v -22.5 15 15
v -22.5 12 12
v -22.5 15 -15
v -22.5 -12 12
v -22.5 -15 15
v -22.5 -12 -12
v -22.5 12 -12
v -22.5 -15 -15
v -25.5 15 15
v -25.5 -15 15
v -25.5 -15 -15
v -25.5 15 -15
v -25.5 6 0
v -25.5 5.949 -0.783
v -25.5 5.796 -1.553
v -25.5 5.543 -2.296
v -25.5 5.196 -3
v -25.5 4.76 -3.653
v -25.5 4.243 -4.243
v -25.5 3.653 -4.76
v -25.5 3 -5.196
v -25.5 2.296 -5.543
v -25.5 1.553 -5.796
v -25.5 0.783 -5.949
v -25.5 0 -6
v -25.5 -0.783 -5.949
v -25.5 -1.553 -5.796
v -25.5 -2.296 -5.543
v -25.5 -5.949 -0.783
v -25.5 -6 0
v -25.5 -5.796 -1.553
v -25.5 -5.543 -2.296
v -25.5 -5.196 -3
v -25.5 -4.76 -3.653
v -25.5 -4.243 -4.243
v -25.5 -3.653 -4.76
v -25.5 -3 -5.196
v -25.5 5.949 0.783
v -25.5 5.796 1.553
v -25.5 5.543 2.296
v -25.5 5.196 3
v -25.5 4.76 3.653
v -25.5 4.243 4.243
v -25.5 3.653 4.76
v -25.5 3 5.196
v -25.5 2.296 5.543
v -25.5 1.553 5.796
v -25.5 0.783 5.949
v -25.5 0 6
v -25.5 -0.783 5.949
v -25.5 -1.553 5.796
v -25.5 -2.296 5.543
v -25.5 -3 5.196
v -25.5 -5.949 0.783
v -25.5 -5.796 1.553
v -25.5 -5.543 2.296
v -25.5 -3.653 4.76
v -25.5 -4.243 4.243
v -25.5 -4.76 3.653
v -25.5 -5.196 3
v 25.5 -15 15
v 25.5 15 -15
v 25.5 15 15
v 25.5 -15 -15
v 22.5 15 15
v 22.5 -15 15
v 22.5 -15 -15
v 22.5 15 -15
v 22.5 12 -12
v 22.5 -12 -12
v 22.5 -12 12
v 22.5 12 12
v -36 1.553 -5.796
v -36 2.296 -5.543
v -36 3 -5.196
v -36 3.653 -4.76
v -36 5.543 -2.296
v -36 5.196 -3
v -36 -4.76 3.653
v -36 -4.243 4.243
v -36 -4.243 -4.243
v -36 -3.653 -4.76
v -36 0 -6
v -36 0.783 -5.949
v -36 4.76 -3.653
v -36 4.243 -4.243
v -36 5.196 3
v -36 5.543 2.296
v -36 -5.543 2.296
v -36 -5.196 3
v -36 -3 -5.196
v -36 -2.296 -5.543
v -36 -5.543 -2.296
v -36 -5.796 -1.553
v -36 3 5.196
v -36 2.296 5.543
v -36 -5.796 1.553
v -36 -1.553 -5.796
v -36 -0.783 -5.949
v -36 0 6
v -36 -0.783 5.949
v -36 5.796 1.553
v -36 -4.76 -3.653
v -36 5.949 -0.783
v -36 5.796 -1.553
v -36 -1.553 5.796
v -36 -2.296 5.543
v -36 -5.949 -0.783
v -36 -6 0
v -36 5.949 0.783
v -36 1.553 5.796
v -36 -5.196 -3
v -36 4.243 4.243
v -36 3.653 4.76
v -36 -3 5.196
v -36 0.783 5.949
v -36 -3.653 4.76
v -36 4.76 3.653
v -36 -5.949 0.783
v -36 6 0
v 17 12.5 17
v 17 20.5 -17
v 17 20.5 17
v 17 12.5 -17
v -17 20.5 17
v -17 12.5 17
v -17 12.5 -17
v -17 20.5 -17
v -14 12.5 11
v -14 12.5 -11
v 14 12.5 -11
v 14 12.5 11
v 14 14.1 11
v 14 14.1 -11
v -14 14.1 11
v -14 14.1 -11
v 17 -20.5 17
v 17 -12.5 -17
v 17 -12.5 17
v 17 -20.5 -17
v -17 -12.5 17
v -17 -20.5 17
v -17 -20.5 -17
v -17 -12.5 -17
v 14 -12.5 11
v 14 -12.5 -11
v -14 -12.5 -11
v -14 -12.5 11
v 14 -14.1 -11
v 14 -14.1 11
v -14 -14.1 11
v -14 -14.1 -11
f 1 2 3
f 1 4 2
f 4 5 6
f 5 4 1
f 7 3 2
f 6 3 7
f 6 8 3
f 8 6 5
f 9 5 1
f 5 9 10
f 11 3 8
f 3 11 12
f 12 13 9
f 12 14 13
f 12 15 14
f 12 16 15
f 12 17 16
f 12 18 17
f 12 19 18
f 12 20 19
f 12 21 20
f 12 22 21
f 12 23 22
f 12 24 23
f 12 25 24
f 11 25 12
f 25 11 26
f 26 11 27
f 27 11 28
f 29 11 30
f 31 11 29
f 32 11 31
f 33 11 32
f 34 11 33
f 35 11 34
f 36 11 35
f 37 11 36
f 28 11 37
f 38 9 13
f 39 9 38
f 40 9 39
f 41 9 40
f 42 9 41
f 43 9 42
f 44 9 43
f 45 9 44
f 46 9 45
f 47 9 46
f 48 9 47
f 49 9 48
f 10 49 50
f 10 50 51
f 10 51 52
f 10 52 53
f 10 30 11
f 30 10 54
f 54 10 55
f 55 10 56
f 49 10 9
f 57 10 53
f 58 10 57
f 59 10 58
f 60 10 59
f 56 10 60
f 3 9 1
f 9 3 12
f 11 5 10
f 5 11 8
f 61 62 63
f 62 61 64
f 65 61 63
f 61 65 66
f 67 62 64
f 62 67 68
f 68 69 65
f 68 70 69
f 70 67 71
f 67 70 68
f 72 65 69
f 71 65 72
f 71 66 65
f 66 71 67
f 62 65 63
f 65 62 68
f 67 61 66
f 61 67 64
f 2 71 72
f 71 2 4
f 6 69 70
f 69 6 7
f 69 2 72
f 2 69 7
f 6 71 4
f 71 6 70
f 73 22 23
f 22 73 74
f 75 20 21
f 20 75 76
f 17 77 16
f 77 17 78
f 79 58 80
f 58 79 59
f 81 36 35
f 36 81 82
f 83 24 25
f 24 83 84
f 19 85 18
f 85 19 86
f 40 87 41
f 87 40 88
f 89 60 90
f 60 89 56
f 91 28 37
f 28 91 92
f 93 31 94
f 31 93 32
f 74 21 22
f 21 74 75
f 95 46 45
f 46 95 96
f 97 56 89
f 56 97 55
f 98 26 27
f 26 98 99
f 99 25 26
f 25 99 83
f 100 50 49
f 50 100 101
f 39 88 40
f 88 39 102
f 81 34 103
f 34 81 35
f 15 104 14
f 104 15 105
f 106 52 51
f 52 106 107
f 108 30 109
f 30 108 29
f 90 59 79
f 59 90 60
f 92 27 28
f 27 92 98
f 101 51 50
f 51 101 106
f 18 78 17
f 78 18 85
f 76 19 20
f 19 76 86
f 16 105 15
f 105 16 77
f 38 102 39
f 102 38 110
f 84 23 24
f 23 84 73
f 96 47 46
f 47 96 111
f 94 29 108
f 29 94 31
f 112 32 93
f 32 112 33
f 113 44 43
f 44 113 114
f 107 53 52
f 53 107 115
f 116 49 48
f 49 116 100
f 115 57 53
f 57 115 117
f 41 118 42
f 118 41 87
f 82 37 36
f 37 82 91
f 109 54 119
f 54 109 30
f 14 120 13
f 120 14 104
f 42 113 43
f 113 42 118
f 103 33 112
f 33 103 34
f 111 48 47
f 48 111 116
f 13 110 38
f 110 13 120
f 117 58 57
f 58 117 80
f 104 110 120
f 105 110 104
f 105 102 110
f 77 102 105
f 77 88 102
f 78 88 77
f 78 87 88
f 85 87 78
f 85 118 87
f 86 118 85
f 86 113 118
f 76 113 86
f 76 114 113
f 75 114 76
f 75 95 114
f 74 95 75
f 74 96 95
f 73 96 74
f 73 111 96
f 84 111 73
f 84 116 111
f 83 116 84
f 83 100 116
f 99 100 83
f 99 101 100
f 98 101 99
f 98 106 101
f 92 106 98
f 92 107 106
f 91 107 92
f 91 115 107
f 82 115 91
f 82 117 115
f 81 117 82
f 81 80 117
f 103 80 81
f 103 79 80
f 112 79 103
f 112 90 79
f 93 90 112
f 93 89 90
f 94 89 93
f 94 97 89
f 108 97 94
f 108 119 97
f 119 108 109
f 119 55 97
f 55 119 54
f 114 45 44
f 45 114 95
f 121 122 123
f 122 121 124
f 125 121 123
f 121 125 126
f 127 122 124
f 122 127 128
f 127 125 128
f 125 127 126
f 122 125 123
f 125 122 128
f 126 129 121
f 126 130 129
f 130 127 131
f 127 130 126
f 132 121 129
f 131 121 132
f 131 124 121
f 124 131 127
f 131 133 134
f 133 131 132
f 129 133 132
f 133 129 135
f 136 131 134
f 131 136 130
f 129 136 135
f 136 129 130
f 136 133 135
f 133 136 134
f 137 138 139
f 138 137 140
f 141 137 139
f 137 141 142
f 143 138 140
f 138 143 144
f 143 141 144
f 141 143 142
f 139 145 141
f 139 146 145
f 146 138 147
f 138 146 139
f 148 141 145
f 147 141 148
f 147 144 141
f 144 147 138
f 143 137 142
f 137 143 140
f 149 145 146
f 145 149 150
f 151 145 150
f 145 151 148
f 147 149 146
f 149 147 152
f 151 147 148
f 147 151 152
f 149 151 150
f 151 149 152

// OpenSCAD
// RoboBarista IR40-50 shared grip concept, millimetres.
// CONCEPT ONLY. Not load-rated, not dimensioned to vendor CAD.
// part: "handle", "finger", "assembly"; mount: "portafilter" or "pitcher".
part="assembly";
mount="portafilter";
grip_width=24; // across closing direction (Y)
grip_height=24;
grip_length=48;
stop_width=3;
stop_height=3;
clearance=0.5;
finger_thickness=8;
finger_length=34;
$fn=48;

module handle() {
  color("dimgray")
  union() {
    // Positive stops in the tool axis direction X.
    translate([-grip_length/2,0,0]) cube([stop_width,grip_width+2*stop_height,grip_height+2*stop_height],center=true);
    translate([grip_length/2,0,0]) cube([stop_width,grip_width+2*stop_height,grip_height+2*stop_height],center=true);
    cube([grip_length,grip_width,grip_height],center=true);
    // Conceptual mounting stem, NOT a real Decent thread or pitcher fastener.
    translate([-grip_length/2-12,0,0]) rotate([0,90,0]) cylinder(d=12,h=12);
  }
}
module finger(side=1) {
  color("teal")
  difference() {
    translate([0,side*(grip_width/2+clearance+finger_thickness/2),0])
      cube([finger_length,finger_thickness,grip_height+10],center=true);
    // shallow matching longitudinal anti-slip channel; provisional
    translate([0,side*(grip_width/2+clearance+0.6),0])
      cube([finger_length-6,2,grip_height-2],center=true);
  }
}
if(part=="handle") handle();
else if(part=="finger") finger(1);
else {handle();finger(1);finger(-1);}
